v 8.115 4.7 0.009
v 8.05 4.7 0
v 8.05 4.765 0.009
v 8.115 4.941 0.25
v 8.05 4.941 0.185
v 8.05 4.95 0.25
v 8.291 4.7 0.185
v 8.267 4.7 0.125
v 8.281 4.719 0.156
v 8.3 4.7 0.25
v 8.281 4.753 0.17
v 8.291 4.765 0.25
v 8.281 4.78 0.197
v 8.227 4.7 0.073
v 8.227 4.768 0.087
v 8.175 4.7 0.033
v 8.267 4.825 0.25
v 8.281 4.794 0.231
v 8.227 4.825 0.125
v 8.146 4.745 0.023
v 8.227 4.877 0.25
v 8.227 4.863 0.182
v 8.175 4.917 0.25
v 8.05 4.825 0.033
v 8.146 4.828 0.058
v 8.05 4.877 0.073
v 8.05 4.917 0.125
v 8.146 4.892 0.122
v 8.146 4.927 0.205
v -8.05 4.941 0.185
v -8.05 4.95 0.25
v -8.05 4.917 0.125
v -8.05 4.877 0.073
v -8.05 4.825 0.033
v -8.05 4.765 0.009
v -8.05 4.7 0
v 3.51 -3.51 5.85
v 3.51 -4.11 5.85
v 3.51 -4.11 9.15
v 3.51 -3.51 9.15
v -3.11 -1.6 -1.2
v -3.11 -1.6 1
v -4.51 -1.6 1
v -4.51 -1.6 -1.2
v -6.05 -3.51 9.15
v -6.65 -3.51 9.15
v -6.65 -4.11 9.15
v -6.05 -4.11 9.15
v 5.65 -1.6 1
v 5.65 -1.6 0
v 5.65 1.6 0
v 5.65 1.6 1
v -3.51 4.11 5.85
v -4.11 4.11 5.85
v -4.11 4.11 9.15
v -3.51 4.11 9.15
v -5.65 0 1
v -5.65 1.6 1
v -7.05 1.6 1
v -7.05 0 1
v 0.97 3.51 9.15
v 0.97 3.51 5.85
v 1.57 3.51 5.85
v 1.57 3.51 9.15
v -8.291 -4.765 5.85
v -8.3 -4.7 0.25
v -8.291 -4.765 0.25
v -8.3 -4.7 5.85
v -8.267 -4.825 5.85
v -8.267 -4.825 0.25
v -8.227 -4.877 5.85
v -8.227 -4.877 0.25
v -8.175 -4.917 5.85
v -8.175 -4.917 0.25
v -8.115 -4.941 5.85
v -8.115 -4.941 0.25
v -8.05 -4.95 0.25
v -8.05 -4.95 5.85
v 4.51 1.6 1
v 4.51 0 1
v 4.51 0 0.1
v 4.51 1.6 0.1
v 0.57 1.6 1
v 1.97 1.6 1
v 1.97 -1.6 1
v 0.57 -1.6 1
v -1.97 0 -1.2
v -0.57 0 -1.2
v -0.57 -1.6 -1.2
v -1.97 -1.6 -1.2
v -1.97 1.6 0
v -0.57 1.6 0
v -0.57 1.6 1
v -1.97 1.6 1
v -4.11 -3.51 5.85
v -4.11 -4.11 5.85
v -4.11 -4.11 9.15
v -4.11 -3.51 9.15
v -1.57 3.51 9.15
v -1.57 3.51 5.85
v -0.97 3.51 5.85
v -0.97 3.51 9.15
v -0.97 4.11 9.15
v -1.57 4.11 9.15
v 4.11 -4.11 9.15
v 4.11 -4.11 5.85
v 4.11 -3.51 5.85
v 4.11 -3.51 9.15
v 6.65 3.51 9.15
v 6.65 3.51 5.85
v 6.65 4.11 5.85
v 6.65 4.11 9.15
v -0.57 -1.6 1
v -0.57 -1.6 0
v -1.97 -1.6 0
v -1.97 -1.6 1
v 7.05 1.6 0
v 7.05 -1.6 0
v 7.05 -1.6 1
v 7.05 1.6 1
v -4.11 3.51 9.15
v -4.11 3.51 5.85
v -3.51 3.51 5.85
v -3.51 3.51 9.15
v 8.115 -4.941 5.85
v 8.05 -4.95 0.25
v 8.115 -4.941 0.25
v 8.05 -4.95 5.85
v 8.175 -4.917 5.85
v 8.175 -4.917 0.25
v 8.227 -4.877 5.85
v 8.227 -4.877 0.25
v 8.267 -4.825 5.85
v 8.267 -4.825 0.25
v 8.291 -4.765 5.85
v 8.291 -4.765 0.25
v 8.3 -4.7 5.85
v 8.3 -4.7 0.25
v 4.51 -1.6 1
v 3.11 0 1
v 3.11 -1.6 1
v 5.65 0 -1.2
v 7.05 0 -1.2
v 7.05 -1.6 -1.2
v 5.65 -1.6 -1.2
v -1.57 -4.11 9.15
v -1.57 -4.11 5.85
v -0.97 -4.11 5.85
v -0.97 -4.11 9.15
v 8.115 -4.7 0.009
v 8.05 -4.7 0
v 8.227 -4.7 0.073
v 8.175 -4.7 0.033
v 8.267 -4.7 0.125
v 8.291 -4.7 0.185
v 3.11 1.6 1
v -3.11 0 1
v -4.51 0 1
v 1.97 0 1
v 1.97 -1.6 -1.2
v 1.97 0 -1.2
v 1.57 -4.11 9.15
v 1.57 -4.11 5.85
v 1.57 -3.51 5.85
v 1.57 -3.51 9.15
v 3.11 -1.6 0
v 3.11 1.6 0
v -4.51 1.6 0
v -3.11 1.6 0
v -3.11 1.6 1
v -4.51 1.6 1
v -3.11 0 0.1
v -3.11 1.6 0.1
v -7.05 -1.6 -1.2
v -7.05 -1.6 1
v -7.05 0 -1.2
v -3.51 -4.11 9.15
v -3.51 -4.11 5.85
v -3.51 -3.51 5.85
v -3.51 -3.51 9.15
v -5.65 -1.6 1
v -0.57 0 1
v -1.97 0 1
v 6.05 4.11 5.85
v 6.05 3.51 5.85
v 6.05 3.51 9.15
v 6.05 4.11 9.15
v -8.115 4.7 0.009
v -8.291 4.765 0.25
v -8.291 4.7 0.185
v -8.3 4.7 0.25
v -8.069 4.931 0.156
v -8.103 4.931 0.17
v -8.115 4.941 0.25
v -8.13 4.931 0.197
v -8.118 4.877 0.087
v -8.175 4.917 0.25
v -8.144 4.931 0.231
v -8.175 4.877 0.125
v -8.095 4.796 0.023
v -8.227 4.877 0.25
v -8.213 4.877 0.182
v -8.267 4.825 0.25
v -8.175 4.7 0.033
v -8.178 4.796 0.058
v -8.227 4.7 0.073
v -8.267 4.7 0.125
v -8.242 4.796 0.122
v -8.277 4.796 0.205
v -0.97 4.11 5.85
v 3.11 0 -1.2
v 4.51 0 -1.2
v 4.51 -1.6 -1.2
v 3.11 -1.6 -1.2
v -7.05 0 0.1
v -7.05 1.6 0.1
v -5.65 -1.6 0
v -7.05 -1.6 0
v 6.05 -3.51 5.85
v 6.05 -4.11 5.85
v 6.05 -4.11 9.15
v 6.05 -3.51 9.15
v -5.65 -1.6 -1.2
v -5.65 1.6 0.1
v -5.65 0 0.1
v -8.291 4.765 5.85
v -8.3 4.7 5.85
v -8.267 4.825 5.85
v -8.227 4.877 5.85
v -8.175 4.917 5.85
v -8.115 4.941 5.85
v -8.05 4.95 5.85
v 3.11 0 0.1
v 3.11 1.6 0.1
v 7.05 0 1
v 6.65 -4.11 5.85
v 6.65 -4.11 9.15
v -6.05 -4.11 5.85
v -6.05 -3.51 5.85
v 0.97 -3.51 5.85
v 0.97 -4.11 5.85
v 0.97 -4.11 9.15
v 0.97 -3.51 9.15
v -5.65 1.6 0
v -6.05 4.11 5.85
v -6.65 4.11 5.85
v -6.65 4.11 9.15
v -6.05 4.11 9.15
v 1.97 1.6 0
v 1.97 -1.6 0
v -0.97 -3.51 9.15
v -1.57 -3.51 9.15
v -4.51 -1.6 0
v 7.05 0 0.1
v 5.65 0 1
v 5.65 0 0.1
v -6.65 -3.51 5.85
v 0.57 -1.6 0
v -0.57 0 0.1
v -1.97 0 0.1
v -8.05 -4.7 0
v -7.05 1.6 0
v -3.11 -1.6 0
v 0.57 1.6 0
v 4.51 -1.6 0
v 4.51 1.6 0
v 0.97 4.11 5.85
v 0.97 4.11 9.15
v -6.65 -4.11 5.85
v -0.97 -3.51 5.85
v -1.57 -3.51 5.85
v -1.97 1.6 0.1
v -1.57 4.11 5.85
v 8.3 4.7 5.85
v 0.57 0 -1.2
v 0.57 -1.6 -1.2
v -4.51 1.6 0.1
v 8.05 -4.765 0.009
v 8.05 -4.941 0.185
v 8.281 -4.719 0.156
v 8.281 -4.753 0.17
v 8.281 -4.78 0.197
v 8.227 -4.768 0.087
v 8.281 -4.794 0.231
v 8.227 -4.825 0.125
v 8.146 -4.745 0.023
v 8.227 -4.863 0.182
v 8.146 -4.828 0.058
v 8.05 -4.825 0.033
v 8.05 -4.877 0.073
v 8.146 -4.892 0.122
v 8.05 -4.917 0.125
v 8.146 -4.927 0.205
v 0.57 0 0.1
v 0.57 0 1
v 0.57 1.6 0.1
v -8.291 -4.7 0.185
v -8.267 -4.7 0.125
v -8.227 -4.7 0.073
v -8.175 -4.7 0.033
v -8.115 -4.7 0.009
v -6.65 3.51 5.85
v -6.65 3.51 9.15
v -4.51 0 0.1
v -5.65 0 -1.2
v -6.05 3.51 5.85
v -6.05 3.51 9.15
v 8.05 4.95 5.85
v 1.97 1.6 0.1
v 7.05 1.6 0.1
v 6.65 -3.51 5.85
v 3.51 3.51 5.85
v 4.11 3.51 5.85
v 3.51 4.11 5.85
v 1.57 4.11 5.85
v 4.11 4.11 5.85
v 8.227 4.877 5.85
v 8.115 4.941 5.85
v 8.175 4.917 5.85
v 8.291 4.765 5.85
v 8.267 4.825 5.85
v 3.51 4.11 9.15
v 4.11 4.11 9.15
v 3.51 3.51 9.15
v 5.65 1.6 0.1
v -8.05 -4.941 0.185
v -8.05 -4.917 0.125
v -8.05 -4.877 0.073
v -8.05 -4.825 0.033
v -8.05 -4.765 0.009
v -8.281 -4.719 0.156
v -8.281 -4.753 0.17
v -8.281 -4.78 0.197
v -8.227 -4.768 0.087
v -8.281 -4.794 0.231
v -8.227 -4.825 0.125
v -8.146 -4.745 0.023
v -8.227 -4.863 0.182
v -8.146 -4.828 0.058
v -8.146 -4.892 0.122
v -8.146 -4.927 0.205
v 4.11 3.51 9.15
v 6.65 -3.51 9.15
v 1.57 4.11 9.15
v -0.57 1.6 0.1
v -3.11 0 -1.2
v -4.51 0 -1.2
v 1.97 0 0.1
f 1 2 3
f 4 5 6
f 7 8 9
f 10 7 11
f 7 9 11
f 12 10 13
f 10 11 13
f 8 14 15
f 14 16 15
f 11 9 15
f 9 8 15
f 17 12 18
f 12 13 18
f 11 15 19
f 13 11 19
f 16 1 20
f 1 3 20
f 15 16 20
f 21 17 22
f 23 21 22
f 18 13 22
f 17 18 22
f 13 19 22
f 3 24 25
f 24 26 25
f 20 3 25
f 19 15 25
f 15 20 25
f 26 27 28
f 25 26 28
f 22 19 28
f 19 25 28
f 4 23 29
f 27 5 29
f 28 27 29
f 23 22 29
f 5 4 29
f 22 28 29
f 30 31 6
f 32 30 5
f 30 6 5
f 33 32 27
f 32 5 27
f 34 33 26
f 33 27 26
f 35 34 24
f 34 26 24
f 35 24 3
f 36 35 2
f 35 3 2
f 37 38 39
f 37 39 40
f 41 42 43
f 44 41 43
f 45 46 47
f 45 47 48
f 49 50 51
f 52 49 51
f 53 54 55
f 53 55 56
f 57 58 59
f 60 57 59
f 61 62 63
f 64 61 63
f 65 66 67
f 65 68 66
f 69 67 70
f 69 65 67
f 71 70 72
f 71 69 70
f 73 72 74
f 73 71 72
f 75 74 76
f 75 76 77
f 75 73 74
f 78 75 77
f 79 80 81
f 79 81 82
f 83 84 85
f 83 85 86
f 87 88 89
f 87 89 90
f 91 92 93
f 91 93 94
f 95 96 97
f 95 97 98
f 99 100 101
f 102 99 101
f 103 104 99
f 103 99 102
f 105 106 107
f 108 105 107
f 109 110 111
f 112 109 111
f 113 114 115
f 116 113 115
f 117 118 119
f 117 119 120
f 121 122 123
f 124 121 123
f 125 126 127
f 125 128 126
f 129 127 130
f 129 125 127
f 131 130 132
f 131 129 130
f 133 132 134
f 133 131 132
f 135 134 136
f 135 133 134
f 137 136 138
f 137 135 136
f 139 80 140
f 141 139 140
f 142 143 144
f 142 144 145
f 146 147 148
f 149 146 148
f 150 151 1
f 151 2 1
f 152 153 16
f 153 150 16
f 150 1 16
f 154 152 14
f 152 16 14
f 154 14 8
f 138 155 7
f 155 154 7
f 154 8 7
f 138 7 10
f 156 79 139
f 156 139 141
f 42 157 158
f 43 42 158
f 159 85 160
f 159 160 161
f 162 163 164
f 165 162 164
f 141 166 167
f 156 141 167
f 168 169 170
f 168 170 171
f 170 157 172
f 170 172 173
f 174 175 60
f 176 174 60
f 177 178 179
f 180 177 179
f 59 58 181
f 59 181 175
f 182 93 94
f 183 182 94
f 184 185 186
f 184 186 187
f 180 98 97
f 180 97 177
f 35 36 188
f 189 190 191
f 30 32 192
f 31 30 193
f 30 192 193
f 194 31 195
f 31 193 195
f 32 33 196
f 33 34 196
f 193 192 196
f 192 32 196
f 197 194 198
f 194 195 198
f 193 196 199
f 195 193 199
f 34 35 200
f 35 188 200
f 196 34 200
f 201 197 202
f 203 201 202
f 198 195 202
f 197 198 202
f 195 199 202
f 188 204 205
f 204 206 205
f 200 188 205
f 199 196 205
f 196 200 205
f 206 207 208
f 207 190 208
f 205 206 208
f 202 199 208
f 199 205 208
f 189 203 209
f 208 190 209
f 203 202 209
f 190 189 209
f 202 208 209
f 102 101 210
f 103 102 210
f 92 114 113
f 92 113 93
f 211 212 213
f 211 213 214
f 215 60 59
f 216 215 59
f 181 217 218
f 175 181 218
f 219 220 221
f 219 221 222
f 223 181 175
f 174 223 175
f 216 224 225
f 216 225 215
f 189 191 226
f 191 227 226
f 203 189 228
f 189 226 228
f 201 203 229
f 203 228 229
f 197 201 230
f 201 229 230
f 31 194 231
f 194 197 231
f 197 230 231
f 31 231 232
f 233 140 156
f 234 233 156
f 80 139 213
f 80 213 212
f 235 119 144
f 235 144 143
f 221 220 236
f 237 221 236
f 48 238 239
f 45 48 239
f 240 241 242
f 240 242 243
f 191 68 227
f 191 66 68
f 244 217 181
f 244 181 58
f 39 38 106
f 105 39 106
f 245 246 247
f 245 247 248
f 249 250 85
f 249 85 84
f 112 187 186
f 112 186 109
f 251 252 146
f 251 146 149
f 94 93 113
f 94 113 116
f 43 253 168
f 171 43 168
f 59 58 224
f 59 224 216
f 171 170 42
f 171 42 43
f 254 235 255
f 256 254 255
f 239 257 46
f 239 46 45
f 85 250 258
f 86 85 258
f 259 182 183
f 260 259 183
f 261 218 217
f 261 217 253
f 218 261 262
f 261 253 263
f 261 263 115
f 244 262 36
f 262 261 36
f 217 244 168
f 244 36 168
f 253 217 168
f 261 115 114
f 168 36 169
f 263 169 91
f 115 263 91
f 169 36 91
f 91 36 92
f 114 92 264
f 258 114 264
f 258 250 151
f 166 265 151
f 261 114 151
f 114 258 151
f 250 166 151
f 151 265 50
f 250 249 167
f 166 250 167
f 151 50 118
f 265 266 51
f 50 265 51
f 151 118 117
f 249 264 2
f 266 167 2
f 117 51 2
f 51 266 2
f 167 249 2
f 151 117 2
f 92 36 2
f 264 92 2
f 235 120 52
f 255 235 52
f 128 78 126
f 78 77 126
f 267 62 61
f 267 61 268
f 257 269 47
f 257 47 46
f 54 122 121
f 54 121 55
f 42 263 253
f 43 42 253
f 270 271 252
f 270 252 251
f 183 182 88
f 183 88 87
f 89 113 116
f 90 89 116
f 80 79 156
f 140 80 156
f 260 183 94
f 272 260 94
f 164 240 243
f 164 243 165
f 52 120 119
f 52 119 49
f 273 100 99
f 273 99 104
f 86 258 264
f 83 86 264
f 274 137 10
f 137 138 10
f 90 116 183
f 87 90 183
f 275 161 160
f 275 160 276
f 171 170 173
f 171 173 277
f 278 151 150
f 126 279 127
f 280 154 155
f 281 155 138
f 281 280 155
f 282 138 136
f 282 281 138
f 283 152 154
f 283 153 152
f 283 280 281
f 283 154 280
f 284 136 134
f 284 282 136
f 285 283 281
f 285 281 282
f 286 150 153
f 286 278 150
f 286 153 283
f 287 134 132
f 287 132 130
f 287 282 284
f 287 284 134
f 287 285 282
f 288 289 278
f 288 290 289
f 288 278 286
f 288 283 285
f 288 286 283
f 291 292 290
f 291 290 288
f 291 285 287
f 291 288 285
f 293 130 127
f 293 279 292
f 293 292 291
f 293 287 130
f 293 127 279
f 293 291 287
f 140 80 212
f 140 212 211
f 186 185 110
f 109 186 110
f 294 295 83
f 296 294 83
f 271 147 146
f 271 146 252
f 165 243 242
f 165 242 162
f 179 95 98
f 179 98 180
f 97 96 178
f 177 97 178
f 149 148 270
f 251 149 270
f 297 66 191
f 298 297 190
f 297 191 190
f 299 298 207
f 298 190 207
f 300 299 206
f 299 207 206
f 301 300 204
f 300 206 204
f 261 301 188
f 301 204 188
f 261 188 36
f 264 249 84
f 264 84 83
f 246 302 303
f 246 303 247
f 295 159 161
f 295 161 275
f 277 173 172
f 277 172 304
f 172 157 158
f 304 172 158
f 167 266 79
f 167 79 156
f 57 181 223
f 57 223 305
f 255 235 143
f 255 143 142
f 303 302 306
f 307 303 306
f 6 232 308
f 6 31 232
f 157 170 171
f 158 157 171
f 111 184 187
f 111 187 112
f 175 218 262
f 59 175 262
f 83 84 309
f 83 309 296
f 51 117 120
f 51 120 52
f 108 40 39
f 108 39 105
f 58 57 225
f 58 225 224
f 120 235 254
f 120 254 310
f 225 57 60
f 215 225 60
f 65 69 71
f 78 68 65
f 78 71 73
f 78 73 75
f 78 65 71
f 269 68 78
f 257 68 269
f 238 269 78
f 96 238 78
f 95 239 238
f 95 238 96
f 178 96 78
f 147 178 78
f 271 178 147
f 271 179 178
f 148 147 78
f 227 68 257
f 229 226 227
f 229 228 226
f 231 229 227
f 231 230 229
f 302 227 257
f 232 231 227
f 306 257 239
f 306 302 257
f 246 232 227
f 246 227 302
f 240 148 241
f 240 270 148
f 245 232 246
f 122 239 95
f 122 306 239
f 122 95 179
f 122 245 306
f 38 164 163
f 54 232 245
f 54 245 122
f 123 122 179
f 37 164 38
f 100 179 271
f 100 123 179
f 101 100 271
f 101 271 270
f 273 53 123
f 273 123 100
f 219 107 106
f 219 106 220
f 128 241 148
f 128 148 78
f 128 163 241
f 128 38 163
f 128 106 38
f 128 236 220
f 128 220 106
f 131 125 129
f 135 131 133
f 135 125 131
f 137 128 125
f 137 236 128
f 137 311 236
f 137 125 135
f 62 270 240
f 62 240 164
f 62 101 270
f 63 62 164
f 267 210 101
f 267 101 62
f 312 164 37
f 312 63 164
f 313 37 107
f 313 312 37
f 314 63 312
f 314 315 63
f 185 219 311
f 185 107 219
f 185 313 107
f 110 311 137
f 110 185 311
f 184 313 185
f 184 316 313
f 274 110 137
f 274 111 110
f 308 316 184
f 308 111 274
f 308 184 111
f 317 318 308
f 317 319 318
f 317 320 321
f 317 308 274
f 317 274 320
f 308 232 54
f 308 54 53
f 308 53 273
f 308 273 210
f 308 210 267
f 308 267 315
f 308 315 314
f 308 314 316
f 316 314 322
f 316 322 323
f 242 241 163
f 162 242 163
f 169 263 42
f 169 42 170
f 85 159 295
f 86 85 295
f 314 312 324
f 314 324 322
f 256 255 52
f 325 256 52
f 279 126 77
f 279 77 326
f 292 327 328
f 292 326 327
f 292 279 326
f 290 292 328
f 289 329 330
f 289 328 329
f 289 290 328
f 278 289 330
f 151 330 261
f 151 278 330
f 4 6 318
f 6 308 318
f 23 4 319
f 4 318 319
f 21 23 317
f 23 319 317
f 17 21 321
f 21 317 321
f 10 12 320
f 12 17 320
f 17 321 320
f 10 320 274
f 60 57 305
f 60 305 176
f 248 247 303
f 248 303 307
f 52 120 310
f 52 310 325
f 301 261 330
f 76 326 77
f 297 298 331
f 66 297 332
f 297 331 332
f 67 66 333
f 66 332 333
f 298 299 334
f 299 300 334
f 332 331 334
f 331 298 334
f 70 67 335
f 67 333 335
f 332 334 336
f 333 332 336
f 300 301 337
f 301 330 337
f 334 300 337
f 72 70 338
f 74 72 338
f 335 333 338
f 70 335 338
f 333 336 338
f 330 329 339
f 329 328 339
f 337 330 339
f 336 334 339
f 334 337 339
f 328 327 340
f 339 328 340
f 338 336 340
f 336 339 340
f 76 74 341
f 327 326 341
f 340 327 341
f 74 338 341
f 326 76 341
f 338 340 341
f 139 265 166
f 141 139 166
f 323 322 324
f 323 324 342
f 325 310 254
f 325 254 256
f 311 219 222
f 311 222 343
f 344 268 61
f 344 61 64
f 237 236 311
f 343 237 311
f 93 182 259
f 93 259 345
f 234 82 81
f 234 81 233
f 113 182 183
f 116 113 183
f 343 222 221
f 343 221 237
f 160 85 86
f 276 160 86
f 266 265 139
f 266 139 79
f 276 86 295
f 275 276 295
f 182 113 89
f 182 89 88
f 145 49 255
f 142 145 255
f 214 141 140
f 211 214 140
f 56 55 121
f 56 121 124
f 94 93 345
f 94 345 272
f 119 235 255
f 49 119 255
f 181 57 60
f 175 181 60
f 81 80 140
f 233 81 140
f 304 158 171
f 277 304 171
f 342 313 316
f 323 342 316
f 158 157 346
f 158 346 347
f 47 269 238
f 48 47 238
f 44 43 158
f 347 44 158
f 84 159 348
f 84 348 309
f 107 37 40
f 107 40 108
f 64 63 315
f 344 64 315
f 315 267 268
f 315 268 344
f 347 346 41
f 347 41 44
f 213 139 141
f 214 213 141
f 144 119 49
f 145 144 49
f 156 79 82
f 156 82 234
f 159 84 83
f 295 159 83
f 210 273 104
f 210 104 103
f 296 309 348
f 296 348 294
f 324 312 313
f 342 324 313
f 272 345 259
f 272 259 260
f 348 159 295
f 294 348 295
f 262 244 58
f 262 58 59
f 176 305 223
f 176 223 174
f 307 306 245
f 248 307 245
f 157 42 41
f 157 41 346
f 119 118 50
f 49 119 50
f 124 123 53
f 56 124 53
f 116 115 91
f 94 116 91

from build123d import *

# Parameters (mm, degrees)
IZIM1_W                       = 16.6
IZIM1_H                       = 9.9
Y_KSEKLIK_EKSTR_ZYON1_DEPTH   = 5.85
IZIM2_W                       = 1.4
IZIM2_H                       = 3.2
KES_EKSTR_ZYON1_DEPTH         = 1
IZIM3_W                       = 1.4
IZIM3_H                       = 1.6
Y_KSEKLIK_EKSTR_ZYON2_DEPTH   = 2.2
Y_KSEKLIK_EKSTR_ZYON2_2_DEPTH = 2.2
Y_KSEKLIK_EKSTR_ZYON2_3_DEPTH = 2.2
Y_KSEKLIK_EKSTR_ZYON2_4_DEPTH = 2.2
Y_KSEKLIK_EKSTR_ZYON2_5_DEPTH = 2.2
Y_KSEKLIK_EKSTR_ZYON2_6_DEPTH = 2.2
IZIM4_W                       = 1.4
IZIM4_H                       = 1.6
Y_KSEKLIK_EKSTR_ZYON3_DEPTH   = 0.9
Y_KSEKLIK_EKSTR_ZYON3_2_DEPTH = 0.9
Y_KSEKLIK_EKSTR_ZYON3_3_DEPTH = 0.9
Y_KSEKLIK_EKSTR_ZYON3_4_DEPTH = 0.9
Y_KSEKLIK_EKSTR_ZYON3_5_DEPTH = 0.9
Y_KSEKLIK_EKSTR_ZYON3_6_DEPTH = 0.9
RADYUS1_R                     = 0.25
IZIM5_W                       = 0.6
IZIM5_H                       = 0.6
Y_KSEKLIK_EKSTR_ZYON4_DEPTH   = 3.3


with BuildPart() as part:
    # Çizim1 → Yükseklik-Ekstrüzyon1 (new body)
    with BuildSketch(Plane.XY):
        Rectangle(IZIM1_W, IZIM1_H)
    extrude(amount=Y_KSEKLIK_EKSTR_ZYON1_DEPTH)

    # Çizim2 → Kes-Ekstrüzyon1 (cut)
    with BuildSketch(Plane(origin=(0, 0, 0), x_dir=(-1, 0, 0), z_dir=(0, 0, -1))):
        with Locations((-6.35, 0)):
            Rectangle(IZIM2_W, IZIM2_H)
        with Locations((-3.81, 0)):
            Rectangle(IZIM2_W, IZIM2_H)
        with Locations((-1.27, 0)):
            Rectangle(IZIM2_W, IZIM2_H)
        with Locations((1.27, 0)):
            Rectangle(IZIM2_W, IZIM2_H)
        with Locations((3.81, 0)):
            Rectangle(IZIM2_W, IZIM2_H)
        with Locations((6.35, 0)):
            Rectangle(IZIM2_W, IZIM2_H)
    extrude(amount=-KES_EKSTR_ZYON1_DEPTH, mode=Mode.SUBTRACT)

    # Radyus1
    radyus1_edges = [part.edges().sort_by_distance(p)[0] for p in [
        (0, -4.95, 0),
        (-8.3, 0, 0),
        (0, 4.95, 0),
        (8.3, 0, 0),
        (8.3, -4.95, 2.925),
        (-8.3, -4.95, 2.925),
        (-8.3, 4.95, 2.925),
        (8.3, 4.95, 2.925),
    ]]
    fillet(radyus1_edges, radius=RADYUS1_R)

    # Çizim5 → Yükseklik-Ekstrüzyon4 (add)
    with BuildSketch(Plane.XY.offset(5.85)):
        with Locations((-6.35, -3.81)):
            Rectangle(IZIM5_W, IZIM5_H)
        with Locations((-3.81, -3.81)):
            Rectangle(IZIM5_W, IZIM5_H)
        with Locations((-1.27, -3.81)):
            Rectangle(IZIM5_W, IZIM5_H)
        with Locations((1.27, -3.81)):
            Rectangle(IZIM5_W, IZIM5_H)
        with Locations((3.81, -3.81)):
            Rectangle(IZIM5_W, IZIM5_H)
        with Locations((6.35, -3.81)):
            Rectangle(IZIM5_W, IZIM5_H)
        with Locations((-6.35, 3.81)):
            Rectangle(IZIM5_W, IZIM5_H)
        with Locations((-3.81, 3.81)):
            Rectangle(IZIM5_W, IZIM5_H)
        with Locations((-1.27, 3.81)):
            Rectangle(IZIM5_W, IZIM5_H)
        with Locations((1.27, 3.81)):
            Rectangle(IZIM5_W, IZIM5_H)
        with Locations((3.81, 3.81)):
            Rectangle(IZIM5_W, IZIM5_H)
        with Locations((6.35, 3.81)):
            Rectangle(IZIM5_W, IZIM5_H)
    extrude(amount=Y_KSEKLIK_EKSTR_ZYON4_DEPTH)


with BuildPart() as body_2:
    # Çizim3 → Yükseklik-Ekstrüzyon2 (new body)
    with BuildSketch(Plane(origin=(0, 0, 1), x_dir=(-1, 0, 0), z_dir=(0, 0, -1))):
        with Locations((-6.35, -0.8)):
            Rectangle(IZIM3_W, IZIM3_H)
    extrude(amount=Y_KSEKLIK_EKSTR_ZYON2_DEPTH)


with BuildPart() as body_3:
    # Çizim3 → Y_kseklik-Ekstr_zyon2 2 (new body)
    with BuildSketch(Plane(origin=(0, 0, 1), x_dir=(-1, 0, 0), z_dir=(0, 0, -1))):
        with Locations((-3.81, -0.8)):
            Rectangle(IZIM3_W, IZIM3_H)
    extrude(amount=Y_KSEKLIK_EKSTR_ZYON2_2_DEPTH)


with BuildPart() as body_4:
    # Çizim3 → Y_kseklik-Ekstr_zyon2 3 (new body)
    with BuildSketch(Plane(origin=(0, 0, 1), x_dir=(-1, 0, 0), z_dir=(0, 0, -1))):
        with Locations((-1.27, -0.8)):
            Rectangle(IZIM3_W, IZIM3_H)
    extrude(amount=Y_KSEKLIK_EKSTR_ZYON2_3_DEPTH)


with BuildPart() as body_5:
    # Çizim3 → Y_kseklik-Ekstr_zyon2 4 (new body)
    with BuildSketch(Plane(origin=(0, 0, 1), x_dir=(-1, 0, 0), z_dir=(0, 0, -1))):
        with Locations((1.27, -0.8)):
            Rectangle(IZIM3_W, IZIM3_H)
    extrude(amount=Y_KSEKLIK_EKSTR_ZYON2_4_DEPTH)


with BuildPart() as body_6:
    # Çizim3 → Y_kseklik-Ekstr_zyon2 5 (new body)
    with BuildSketch(Plane(origin=(0, 0, 1), x_dir=(-1, 0, 0), z_dir=(0, 0, -1))):
        with Locations((3.81, -0.8)):
            Rectangle(IZIM3_W, IZIM3_H)
    extrude(amount=Y_KSEKLIK_EKSTR_ZYON2_5_DEPTH)


with BuildPart() as body_7:
    # Çizim3 → Y_kseklik-Ekstr_zyon2 6 (new body)
    with BuildSketch(Plane(origin=(0, 0, 1), x_dir=(-1, 0, 0), z_dir=(0, 0, -1))):
        with Locations((6.35, -0.8)):
            Rectangle(IZIM3_W, IZIM3_H)
    extrude(amount=Y_KSEKLIK_EKSTR_ZYON2_6_DEPTH)


with BuildPart() as body_8:
    # Çizim4 → Yükseklik-Ekstrüzyon3 (new body)
    with BuildSketch(Plane(origin=(0, 0, 1), x_dir=(-1, 0, 0), z_dir=(0, 0, -1))):
        with Locations((-6.35, 0.8)):
            Rectangle(IZIM4_W, IZIM4_H)
    extrude(amount=Y_KSEKLIK_EKSTR_ZYON3_DEPTH)


with BuildPart() as body_9:
    # Çizim4 → Y_kseklik-Ekstr_zyon3 2 (new body)
    with BuildSketch(Plane(origin=(0, 0, 1), x_dir=(-1, 0, 0), z_dir=(0, 0, -1))):
        with Locations((-3.81, 0.8)):
            Rectangle(IZIM4_W, IZIM4_H)
    extrude(amount=Y_KSEKLIK_EKSTR_ZYON3_2_DEPTH)


with BuildPart() as body_10:
    # Çizim4 → Y_kseklik-Ekstr_zyon3 3 (new body)
    with BuildSketch(Plane(origin=(0, 0, 1), x_dir=(-1, 0, 0), z_dir=(0, 0, -1))):
        with Locations((-1.27, 0.8)):
            Rectangle(IZIM4_W, IZIM4_H)
    extrude(amount=Y_KSEKLIK_EKSTR_ZYON3_3_DEPTH)


with BuildPart() as body_11:
    # Çizim4 → Y_kseklik-Ekstr_zyon3 4 (new body)
    with BuildSketch(Plane(origin=(0, 0, 1), x_dir=(-1, 0, 0), z_dir=(0, 0, -1))):
        with Locations((1.27, 0.8)):
            Rectangle(IZIM4_W, IZIM4_H)
    extrude(amount=Y_KSEKLIK_EKSTR_ZYON3_4_DEPTH)


with BuildPart() as body_12:
    # Çizim4 → Y_kseklik-Ekstr_zyon3 5 (new body)
    with BuildSketch(Plane(origin=(0, 0, 1), x_dir=(-1, 0, 0), z_dir=(0, 0, -1))):
        with Locations((3.81, 0.8)):
            Rectangle(IZIM4_W, IZIM4_H)
    extrude(amount=Y_KSEKLIK_EKSTR_ZYON3_5_DEPTH)


with BuildPart() as body_13:
    # Çizim4 → Y_kseklik-Ekstr_zyon3 6 (new body)
    with BuildSketch(Plane(origin=(0, 0, 1), x_dir=(-1, 0, 0), z_dir=(0, 0, -1))):
        with Locations((6.35, 0.8)):
            Rectangle(IZIM4_W, IZIM4_H)
    extrude(amount=Y_KSEKLIK_EKSTR_ZYON3_6_DEPTH)


solid = Compound([part.part, body_2.part, body_3.part, body_4.part, body_5.part, body_6.part, body_7.part, body_8.part, body_9.part, body_10.part, body_11.part, body_12.part, body_13.part])
